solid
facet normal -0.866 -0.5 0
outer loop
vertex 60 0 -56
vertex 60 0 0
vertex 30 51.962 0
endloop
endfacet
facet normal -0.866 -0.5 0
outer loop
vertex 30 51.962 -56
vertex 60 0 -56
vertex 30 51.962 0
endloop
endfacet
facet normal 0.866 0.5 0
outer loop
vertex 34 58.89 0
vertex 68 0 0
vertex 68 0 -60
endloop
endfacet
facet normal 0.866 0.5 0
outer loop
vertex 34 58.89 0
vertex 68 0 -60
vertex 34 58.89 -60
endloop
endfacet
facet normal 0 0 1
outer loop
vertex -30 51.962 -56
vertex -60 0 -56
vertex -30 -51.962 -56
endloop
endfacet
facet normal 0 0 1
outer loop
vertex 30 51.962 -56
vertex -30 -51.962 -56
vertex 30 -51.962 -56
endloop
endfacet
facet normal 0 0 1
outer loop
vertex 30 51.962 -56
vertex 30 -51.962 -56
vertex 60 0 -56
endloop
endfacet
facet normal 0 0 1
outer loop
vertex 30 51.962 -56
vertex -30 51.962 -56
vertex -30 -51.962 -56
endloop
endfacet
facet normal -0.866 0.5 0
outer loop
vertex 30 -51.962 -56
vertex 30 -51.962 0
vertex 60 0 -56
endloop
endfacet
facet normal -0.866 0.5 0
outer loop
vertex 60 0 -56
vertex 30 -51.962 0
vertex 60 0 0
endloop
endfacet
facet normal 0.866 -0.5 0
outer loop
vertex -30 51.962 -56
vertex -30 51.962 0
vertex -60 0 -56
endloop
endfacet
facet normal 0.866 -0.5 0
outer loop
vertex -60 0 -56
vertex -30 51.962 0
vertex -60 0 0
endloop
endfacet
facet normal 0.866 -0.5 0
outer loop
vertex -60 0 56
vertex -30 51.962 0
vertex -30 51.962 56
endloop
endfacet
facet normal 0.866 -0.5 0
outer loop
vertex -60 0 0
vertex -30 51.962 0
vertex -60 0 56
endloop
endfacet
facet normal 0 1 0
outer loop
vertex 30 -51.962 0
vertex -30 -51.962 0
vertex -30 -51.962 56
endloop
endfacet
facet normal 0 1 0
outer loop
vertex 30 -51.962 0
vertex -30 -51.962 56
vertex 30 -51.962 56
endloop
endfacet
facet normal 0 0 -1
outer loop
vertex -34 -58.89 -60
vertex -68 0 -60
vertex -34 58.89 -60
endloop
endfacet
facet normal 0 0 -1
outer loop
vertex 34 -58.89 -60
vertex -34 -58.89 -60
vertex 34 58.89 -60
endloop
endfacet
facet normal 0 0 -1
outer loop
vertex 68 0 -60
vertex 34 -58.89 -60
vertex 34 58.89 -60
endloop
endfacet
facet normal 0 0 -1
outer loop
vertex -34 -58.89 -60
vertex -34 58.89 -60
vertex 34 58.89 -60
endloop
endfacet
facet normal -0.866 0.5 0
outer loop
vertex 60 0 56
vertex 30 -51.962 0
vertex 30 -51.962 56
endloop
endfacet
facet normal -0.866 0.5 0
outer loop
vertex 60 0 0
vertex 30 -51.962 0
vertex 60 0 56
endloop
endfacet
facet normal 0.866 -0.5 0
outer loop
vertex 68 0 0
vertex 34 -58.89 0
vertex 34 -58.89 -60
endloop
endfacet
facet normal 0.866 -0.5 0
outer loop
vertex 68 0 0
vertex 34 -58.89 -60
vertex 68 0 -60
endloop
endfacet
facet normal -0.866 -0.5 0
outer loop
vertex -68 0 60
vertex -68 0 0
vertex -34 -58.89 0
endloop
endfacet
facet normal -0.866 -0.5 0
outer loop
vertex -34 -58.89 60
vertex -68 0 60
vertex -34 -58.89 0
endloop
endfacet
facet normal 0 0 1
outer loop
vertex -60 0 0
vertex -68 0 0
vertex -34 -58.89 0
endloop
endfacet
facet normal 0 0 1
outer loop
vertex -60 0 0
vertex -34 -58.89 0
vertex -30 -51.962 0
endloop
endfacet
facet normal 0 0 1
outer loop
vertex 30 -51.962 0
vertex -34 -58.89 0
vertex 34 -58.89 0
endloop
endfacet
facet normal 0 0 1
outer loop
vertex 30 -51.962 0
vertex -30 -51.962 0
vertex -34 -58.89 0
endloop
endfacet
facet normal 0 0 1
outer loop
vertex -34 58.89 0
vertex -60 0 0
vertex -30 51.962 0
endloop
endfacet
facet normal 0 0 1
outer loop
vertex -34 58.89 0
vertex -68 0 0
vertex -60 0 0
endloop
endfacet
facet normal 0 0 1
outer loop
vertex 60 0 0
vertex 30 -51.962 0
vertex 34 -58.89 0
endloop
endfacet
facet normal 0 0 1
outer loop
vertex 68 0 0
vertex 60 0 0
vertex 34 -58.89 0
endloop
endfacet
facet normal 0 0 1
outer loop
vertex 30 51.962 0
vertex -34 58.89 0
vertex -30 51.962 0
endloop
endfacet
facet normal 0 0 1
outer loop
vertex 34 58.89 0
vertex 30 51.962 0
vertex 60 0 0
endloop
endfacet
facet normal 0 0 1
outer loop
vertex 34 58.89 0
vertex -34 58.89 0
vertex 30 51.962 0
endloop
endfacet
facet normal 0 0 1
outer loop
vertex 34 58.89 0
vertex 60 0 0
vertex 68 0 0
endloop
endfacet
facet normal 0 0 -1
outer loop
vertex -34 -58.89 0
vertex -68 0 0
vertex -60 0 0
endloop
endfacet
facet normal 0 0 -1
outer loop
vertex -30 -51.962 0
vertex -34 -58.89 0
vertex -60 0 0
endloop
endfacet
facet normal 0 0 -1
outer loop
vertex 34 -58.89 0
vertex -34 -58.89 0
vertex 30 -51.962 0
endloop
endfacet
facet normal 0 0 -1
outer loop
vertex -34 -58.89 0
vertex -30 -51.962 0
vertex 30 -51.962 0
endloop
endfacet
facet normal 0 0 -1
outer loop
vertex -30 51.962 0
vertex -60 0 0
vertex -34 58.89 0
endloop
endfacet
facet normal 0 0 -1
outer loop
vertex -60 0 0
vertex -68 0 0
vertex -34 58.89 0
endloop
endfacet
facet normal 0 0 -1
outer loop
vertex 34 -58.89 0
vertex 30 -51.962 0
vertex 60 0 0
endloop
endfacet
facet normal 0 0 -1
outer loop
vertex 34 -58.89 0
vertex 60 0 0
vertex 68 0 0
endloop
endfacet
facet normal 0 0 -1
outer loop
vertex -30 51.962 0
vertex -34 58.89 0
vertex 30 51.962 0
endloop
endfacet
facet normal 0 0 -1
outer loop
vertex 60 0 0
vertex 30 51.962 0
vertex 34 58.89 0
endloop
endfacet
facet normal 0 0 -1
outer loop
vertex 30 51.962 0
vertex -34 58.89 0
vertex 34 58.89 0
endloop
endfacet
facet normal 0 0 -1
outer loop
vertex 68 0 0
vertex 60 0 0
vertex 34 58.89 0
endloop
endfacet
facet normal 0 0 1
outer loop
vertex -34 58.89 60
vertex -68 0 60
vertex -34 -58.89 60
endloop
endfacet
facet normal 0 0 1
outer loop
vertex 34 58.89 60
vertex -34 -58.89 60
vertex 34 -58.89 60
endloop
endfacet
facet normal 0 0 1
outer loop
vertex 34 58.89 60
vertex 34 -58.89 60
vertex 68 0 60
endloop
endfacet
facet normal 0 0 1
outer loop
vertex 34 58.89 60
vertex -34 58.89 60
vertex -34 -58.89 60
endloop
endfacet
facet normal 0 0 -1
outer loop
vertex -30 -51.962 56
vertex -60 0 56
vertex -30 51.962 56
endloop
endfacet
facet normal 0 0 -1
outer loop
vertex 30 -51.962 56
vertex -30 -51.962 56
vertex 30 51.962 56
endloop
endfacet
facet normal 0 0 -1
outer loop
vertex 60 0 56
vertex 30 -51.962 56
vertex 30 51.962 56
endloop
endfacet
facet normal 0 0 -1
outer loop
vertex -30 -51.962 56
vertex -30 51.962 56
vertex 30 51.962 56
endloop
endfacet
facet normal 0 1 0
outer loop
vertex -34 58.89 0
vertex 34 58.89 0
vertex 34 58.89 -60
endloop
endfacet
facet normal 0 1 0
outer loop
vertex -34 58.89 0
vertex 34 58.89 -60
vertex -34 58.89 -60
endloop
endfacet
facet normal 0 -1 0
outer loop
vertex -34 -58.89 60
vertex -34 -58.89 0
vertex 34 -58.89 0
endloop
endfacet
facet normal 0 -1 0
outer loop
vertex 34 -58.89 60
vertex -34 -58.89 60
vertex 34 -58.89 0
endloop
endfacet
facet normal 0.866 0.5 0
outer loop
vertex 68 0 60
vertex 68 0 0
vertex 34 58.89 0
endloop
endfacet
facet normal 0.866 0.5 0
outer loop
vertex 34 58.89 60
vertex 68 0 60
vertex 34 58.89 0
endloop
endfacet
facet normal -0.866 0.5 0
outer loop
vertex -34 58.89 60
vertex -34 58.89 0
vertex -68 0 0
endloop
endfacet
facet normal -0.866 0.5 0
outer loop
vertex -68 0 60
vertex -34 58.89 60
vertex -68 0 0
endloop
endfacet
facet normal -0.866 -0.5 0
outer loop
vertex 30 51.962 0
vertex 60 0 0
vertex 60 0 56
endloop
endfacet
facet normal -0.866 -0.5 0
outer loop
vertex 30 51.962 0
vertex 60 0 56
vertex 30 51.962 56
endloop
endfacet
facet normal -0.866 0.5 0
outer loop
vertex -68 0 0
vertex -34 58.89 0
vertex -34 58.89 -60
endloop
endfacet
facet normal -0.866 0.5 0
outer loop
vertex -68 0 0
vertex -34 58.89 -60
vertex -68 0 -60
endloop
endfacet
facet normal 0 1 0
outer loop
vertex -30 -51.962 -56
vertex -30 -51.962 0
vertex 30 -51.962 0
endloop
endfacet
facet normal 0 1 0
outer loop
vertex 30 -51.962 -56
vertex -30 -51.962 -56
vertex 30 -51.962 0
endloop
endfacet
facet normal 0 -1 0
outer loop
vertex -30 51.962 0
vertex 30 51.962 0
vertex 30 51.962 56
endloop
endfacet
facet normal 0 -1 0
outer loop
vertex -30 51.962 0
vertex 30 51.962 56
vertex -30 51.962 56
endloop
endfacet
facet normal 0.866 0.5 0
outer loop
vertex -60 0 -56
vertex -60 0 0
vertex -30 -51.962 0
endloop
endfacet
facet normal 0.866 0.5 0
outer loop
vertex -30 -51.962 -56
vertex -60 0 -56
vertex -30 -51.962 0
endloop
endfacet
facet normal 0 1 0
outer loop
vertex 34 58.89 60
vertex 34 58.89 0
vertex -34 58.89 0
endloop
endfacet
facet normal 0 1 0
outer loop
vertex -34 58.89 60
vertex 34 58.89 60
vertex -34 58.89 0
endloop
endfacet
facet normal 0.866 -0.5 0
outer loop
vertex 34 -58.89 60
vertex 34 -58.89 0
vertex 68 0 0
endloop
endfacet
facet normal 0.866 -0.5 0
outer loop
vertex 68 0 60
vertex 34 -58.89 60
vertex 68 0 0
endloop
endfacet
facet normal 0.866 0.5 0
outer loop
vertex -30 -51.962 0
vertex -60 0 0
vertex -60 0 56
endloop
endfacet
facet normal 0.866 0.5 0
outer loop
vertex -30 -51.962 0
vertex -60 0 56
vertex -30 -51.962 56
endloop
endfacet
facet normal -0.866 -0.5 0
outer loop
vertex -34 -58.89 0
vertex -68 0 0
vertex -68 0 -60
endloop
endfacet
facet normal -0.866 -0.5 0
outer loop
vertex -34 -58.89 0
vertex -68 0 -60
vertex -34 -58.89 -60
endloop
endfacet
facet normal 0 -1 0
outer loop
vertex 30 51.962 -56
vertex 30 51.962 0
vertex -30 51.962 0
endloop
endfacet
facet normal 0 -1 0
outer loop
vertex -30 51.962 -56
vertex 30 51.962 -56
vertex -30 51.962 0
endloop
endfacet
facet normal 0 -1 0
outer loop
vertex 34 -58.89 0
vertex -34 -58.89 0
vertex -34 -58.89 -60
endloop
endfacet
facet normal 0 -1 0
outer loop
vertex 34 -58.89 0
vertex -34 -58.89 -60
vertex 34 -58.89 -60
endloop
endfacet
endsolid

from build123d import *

# Parameters (mm, degrees)
F2_DEPTH = 60
F3_DEPTH = 56


with BuildPart() as f2:
    # F1 (on Top) → F2 (new body)
    with BuildSketch(Plane.XY):
        Polygon((-34, 58.889727), (-68, 0), (-34, -58.889727), (34, -58.889727), (68, 0), (34, 58.889727), align=None)
    extrude(amount=F2_DEPTH)

    # F0 (on Top) → F3 (cut)
    with BuildSketch(Plane.XY):
        Polygon((-30, 51.961524), (-60, 0), (-30, -51.961524), (30, -51.961524), (60, 0), (30, 51.961524), align=None)
    extrude(amount=F3_DEPTH, mode=Mode.SUBTRACT)


with BuildPart() as f4_1:
    # F4: instance of F2
    add(f2.part.mirror(Plane.XY))


solid = Compound([f2.part, f4_1.part])
